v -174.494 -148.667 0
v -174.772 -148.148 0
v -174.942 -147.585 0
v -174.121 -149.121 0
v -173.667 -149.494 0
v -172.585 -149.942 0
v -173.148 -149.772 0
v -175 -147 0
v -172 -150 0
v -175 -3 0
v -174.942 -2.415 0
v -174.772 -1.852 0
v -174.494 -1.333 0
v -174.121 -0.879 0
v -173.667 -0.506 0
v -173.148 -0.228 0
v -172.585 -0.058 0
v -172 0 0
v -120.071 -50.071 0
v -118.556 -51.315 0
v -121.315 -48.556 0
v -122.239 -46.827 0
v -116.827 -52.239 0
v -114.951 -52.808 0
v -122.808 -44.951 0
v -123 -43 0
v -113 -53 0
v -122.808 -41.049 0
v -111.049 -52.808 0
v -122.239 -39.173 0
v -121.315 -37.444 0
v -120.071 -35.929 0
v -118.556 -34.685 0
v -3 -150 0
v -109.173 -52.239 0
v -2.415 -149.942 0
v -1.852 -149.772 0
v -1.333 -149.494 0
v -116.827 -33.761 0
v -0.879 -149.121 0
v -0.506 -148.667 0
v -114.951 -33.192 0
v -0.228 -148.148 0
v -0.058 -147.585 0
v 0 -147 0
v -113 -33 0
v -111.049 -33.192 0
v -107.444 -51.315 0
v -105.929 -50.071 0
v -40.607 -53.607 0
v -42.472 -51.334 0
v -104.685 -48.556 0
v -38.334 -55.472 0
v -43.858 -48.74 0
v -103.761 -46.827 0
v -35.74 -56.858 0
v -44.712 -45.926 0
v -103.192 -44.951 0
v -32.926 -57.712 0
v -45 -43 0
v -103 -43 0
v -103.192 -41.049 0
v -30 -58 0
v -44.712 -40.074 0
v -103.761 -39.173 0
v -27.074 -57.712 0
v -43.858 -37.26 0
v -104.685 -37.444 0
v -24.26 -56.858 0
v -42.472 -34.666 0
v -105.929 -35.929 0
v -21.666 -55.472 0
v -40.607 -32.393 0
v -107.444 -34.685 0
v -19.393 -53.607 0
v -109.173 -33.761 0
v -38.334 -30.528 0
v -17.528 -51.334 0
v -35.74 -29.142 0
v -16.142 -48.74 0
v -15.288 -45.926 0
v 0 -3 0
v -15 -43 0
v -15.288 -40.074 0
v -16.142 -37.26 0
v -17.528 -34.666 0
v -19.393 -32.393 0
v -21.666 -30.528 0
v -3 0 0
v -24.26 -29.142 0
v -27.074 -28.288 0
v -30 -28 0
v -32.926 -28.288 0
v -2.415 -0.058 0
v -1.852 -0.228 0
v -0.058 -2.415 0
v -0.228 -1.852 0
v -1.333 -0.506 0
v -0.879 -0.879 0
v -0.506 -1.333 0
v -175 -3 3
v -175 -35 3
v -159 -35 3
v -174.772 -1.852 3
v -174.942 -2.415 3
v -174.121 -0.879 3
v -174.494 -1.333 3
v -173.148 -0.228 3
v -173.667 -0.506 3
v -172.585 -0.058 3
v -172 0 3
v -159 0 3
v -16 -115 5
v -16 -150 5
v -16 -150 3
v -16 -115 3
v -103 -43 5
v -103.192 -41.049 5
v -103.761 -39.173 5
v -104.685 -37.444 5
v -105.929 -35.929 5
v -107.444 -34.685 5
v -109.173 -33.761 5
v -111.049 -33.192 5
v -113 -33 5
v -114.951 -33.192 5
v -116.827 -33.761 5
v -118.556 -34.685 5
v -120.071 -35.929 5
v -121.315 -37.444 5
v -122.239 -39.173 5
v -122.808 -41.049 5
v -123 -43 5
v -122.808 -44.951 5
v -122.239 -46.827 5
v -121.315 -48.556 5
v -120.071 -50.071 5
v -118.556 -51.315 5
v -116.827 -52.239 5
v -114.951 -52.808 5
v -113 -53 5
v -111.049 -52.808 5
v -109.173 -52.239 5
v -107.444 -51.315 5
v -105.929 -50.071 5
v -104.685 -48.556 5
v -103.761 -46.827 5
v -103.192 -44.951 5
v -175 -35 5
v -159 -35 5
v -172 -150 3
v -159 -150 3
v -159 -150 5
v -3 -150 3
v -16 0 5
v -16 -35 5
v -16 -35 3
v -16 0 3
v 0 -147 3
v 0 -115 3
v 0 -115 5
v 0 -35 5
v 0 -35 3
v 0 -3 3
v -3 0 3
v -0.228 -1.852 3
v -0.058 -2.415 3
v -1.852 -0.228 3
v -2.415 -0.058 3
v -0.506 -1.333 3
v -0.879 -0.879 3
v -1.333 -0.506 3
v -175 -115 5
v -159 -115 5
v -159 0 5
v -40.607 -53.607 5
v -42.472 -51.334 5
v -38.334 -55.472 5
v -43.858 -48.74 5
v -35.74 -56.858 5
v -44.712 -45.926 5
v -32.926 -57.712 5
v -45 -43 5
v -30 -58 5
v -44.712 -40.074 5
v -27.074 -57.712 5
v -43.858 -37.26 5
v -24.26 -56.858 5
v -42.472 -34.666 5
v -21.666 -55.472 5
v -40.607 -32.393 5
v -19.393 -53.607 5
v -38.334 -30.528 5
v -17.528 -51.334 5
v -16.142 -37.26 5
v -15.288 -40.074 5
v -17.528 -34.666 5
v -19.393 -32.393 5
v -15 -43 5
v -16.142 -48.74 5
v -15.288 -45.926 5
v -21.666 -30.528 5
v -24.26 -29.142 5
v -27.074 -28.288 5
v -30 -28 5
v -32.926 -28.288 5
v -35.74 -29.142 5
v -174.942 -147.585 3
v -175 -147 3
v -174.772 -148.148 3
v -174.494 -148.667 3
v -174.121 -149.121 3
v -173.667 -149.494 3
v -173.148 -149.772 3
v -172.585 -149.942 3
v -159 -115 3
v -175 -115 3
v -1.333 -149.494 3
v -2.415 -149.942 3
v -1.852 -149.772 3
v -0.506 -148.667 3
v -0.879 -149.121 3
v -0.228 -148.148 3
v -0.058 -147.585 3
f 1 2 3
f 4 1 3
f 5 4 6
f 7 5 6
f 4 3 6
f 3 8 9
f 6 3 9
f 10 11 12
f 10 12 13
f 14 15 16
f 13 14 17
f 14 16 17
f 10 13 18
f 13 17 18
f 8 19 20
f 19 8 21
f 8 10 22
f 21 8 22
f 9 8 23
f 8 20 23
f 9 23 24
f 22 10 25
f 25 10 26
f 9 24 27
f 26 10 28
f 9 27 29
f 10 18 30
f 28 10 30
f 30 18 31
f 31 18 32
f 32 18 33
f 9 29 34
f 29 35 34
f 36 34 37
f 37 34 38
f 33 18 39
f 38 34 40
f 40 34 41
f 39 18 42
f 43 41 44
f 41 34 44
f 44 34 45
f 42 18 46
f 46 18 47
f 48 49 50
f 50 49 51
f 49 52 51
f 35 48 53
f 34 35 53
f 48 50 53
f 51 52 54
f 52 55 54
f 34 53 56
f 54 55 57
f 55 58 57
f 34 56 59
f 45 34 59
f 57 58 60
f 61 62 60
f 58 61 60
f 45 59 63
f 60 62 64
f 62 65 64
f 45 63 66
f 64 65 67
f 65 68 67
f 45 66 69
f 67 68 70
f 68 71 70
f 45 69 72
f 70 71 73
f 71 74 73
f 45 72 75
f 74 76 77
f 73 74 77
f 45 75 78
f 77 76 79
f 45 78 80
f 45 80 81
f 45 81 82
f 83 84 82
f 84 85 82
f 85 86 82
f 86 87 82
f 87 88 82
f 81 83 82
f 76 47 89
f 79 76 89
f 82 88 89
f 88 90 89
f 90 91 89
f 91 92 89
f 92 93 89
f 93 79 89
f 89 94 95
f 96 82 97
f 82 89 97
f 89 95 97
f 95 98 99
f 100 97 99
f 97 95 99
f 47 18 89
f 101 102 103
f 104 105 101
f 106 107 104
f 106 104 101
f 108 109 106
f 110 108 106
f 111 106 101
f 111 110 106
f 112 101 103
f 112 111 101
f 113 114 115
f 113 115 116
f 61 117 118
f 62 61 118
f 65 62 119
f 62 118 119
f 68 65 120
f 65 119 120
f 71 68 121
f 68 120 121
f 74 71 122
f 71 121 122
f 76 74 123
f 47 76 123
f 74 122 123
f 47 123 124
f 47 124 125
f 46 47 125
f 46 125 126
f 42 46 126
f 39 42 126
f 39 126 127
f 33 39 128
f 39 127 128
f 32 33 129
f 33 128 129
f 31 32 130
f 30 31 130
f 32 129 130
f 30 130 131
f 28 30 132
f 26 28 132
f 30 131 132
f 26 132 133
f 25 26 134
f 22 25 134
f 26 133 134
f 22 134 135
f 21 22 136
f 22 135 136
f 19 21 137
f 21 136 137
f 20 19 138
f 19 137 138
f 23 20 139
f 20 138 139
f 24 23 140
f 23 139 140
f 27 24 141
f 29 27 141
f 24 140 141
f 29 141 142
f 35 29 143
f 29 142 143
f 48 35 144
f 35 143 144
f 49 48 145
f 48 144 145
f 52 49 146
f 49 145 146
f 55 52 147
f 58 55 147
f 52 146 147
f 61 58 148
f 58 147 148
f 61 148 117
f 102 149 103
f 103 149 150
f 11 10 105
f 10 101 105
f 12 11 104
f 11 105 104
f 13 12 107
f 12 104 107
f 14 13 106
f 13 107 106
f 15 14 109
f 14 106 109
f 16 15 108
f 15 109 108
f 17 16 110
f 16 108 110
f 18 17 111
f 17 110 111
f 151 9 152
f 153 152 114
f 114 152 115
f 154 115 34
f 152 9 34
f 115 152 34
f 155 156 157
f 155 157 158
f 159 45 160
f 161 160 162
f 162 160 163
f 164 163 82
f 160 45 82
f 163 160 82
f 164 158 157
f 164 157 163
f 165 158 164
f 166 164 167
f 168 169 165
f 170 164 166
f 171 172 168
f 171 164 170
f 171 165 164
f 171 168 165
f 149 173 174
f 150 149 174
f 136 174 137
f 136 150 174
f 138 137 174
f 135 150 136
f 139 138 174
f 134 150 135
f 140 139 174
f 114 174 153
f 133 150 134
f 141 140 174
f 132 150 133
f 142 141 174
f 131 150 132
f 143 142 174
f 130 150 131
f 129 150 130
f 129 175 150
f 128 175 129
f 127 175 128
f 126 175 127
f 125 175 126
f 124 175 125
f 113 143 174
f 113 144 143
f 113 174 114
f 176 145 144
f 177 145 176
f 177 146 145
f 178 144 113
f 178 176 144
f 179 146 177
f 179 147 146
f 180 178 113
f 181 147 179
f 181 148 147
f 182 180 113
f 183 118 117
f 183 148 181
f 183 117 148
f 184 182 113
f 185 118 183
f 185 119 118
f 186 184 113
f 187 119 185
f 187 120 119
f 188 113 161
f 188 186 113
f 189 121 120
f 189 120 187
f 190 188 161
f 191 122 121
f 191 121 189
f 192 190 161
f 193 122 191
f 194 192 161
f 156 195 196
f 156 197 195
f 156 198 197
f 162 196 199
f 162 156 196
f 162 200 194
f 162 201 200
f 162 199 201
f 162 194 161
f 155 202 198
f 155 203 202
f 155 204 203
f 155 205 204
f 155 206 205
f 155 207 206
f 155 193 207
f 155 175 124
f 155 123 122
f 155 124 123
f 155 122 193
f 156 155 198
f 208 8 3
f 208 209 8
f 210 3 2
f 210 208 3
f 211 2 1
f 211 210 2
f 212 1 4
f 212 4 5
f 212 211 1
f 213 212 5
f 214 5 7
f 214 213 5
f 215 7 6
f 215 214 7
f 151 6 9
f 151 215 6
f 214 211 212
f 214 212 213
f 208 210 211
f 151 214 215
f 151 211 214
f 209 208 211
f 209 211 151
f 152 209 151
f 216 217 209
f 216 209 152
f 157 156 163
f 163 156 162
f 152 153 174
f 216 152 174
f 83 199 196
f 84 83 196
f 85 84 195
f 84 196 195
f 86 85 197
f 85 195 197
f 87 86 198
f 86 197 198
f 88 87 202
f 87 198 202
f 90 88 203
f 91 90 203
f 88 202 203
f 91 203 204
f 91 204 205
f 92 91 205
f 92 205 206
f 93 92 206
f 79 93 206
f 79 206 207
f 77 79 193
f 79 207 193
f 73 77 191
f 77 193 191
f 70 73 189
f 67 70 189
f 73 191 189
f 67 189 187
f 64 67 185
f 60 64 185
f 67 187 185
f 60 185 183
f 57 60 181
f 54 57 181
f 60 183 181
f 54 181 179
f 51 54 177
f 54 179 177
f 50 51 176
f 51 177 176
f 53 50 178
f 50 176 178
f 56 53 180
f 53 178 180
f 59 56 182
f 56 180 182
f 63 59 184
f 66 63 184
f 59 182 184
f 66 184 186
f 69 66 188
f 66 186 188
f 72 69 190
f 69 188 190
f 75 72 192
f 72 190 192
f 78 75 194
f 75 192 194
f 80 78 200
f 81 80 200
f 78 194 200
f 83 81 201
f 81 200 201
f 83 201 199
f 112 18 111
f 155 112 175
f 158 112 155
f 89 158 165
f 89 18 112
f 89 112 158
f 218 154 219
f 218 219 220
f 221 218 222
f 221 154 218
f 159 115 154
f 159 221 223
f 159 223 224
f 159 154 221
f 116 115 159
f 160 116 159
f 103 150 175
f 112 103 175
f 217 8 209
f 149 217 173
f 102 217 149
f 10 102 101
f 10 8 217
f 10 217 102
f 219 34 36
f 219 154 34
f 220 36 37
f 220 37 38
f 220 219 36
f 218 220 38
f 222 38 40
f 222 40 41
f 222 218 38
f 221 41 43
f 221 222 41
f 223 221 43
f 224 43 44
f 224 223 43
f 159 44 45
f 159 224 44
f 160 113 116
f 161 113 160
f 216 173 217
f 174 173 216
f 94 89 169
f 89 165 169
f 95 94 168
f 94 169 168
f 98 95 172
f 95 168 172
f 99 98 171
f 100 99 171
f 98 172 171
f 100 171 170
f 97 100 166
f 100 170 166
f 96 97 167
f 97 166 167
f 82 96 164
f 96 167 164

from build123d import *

# Parameters (mm, degrees)
SKETCH1_W           = 175
SKETCH1_H           = 150
BOSS_EXTRUDE1_DEPTH = 5
SKETCH3_R           = 15
SKETCH3_R_2         = 10
CUT_EXTRUDE1_DEPTH  = 5
SKETCH4_W           = 16
SKETCH4_H           = 35
CUT_EXTRUDE2_DEPTH  = 2
FILLET1_R           = 3


with BuildPart() as part:
    # Sketch1 → Boss-Extrude1 (new body)
    with BuildSketch(Plane.XY):
        with Locations((-87.5, -75)):
            Rectangle(SKETCH1_W, SKETCH1_H)
    extrude(amount=BOSS_EXTRUDE1_DEPTH)

    # Sketch3 → Cut-Extrude1 (cut)
    with BuildSketch(Plane.XY.offset(5)):
        with Locations((-30, -43)):
            Circle(SKETCH3_R)
        with Locations((-113, -43)):
            Circle(SKETCH3_R_2)
    extrude(amount=-CUT_EXTRUDE1_DEPTH, mode=Mode.SUBTRACT)

    # Sketch4 → Cut-Extrude2 (cut)
    with BuildSketch(Plane.XY.offset(5)):
        with Locations((-167, -17.5)):
            Rectangle(SKETCH4_W, SKETCH4_H)
        with Locations((-8, -17.5)):
            Rectangle(SKETCH4_W, SKETCH4_H)
        with Locations((-8, -132.5)):
            Rectangle(SKETCH4_W, SKETCH4_H)
        with Locations((-167, -132.5)):
            Rectangle(SKETCH4_W, SKETCH4_H)
    extrude(amount=-CUT_EXTRUDE2_DEPTH, mode=Mode.SUBTRACT)

    # Fillet1
    fillet1_edges = [part.edges().sort_by_distance(p)[0] for p in [
        (0, -150, 1.5),
        (-175, -150, 1.5),
        (-175, 0, 1.5),
        (0, 0, 1.5),
    ]]
    fillet(fillet1_edges, radius=FILLET1_R)


solid = part.part
